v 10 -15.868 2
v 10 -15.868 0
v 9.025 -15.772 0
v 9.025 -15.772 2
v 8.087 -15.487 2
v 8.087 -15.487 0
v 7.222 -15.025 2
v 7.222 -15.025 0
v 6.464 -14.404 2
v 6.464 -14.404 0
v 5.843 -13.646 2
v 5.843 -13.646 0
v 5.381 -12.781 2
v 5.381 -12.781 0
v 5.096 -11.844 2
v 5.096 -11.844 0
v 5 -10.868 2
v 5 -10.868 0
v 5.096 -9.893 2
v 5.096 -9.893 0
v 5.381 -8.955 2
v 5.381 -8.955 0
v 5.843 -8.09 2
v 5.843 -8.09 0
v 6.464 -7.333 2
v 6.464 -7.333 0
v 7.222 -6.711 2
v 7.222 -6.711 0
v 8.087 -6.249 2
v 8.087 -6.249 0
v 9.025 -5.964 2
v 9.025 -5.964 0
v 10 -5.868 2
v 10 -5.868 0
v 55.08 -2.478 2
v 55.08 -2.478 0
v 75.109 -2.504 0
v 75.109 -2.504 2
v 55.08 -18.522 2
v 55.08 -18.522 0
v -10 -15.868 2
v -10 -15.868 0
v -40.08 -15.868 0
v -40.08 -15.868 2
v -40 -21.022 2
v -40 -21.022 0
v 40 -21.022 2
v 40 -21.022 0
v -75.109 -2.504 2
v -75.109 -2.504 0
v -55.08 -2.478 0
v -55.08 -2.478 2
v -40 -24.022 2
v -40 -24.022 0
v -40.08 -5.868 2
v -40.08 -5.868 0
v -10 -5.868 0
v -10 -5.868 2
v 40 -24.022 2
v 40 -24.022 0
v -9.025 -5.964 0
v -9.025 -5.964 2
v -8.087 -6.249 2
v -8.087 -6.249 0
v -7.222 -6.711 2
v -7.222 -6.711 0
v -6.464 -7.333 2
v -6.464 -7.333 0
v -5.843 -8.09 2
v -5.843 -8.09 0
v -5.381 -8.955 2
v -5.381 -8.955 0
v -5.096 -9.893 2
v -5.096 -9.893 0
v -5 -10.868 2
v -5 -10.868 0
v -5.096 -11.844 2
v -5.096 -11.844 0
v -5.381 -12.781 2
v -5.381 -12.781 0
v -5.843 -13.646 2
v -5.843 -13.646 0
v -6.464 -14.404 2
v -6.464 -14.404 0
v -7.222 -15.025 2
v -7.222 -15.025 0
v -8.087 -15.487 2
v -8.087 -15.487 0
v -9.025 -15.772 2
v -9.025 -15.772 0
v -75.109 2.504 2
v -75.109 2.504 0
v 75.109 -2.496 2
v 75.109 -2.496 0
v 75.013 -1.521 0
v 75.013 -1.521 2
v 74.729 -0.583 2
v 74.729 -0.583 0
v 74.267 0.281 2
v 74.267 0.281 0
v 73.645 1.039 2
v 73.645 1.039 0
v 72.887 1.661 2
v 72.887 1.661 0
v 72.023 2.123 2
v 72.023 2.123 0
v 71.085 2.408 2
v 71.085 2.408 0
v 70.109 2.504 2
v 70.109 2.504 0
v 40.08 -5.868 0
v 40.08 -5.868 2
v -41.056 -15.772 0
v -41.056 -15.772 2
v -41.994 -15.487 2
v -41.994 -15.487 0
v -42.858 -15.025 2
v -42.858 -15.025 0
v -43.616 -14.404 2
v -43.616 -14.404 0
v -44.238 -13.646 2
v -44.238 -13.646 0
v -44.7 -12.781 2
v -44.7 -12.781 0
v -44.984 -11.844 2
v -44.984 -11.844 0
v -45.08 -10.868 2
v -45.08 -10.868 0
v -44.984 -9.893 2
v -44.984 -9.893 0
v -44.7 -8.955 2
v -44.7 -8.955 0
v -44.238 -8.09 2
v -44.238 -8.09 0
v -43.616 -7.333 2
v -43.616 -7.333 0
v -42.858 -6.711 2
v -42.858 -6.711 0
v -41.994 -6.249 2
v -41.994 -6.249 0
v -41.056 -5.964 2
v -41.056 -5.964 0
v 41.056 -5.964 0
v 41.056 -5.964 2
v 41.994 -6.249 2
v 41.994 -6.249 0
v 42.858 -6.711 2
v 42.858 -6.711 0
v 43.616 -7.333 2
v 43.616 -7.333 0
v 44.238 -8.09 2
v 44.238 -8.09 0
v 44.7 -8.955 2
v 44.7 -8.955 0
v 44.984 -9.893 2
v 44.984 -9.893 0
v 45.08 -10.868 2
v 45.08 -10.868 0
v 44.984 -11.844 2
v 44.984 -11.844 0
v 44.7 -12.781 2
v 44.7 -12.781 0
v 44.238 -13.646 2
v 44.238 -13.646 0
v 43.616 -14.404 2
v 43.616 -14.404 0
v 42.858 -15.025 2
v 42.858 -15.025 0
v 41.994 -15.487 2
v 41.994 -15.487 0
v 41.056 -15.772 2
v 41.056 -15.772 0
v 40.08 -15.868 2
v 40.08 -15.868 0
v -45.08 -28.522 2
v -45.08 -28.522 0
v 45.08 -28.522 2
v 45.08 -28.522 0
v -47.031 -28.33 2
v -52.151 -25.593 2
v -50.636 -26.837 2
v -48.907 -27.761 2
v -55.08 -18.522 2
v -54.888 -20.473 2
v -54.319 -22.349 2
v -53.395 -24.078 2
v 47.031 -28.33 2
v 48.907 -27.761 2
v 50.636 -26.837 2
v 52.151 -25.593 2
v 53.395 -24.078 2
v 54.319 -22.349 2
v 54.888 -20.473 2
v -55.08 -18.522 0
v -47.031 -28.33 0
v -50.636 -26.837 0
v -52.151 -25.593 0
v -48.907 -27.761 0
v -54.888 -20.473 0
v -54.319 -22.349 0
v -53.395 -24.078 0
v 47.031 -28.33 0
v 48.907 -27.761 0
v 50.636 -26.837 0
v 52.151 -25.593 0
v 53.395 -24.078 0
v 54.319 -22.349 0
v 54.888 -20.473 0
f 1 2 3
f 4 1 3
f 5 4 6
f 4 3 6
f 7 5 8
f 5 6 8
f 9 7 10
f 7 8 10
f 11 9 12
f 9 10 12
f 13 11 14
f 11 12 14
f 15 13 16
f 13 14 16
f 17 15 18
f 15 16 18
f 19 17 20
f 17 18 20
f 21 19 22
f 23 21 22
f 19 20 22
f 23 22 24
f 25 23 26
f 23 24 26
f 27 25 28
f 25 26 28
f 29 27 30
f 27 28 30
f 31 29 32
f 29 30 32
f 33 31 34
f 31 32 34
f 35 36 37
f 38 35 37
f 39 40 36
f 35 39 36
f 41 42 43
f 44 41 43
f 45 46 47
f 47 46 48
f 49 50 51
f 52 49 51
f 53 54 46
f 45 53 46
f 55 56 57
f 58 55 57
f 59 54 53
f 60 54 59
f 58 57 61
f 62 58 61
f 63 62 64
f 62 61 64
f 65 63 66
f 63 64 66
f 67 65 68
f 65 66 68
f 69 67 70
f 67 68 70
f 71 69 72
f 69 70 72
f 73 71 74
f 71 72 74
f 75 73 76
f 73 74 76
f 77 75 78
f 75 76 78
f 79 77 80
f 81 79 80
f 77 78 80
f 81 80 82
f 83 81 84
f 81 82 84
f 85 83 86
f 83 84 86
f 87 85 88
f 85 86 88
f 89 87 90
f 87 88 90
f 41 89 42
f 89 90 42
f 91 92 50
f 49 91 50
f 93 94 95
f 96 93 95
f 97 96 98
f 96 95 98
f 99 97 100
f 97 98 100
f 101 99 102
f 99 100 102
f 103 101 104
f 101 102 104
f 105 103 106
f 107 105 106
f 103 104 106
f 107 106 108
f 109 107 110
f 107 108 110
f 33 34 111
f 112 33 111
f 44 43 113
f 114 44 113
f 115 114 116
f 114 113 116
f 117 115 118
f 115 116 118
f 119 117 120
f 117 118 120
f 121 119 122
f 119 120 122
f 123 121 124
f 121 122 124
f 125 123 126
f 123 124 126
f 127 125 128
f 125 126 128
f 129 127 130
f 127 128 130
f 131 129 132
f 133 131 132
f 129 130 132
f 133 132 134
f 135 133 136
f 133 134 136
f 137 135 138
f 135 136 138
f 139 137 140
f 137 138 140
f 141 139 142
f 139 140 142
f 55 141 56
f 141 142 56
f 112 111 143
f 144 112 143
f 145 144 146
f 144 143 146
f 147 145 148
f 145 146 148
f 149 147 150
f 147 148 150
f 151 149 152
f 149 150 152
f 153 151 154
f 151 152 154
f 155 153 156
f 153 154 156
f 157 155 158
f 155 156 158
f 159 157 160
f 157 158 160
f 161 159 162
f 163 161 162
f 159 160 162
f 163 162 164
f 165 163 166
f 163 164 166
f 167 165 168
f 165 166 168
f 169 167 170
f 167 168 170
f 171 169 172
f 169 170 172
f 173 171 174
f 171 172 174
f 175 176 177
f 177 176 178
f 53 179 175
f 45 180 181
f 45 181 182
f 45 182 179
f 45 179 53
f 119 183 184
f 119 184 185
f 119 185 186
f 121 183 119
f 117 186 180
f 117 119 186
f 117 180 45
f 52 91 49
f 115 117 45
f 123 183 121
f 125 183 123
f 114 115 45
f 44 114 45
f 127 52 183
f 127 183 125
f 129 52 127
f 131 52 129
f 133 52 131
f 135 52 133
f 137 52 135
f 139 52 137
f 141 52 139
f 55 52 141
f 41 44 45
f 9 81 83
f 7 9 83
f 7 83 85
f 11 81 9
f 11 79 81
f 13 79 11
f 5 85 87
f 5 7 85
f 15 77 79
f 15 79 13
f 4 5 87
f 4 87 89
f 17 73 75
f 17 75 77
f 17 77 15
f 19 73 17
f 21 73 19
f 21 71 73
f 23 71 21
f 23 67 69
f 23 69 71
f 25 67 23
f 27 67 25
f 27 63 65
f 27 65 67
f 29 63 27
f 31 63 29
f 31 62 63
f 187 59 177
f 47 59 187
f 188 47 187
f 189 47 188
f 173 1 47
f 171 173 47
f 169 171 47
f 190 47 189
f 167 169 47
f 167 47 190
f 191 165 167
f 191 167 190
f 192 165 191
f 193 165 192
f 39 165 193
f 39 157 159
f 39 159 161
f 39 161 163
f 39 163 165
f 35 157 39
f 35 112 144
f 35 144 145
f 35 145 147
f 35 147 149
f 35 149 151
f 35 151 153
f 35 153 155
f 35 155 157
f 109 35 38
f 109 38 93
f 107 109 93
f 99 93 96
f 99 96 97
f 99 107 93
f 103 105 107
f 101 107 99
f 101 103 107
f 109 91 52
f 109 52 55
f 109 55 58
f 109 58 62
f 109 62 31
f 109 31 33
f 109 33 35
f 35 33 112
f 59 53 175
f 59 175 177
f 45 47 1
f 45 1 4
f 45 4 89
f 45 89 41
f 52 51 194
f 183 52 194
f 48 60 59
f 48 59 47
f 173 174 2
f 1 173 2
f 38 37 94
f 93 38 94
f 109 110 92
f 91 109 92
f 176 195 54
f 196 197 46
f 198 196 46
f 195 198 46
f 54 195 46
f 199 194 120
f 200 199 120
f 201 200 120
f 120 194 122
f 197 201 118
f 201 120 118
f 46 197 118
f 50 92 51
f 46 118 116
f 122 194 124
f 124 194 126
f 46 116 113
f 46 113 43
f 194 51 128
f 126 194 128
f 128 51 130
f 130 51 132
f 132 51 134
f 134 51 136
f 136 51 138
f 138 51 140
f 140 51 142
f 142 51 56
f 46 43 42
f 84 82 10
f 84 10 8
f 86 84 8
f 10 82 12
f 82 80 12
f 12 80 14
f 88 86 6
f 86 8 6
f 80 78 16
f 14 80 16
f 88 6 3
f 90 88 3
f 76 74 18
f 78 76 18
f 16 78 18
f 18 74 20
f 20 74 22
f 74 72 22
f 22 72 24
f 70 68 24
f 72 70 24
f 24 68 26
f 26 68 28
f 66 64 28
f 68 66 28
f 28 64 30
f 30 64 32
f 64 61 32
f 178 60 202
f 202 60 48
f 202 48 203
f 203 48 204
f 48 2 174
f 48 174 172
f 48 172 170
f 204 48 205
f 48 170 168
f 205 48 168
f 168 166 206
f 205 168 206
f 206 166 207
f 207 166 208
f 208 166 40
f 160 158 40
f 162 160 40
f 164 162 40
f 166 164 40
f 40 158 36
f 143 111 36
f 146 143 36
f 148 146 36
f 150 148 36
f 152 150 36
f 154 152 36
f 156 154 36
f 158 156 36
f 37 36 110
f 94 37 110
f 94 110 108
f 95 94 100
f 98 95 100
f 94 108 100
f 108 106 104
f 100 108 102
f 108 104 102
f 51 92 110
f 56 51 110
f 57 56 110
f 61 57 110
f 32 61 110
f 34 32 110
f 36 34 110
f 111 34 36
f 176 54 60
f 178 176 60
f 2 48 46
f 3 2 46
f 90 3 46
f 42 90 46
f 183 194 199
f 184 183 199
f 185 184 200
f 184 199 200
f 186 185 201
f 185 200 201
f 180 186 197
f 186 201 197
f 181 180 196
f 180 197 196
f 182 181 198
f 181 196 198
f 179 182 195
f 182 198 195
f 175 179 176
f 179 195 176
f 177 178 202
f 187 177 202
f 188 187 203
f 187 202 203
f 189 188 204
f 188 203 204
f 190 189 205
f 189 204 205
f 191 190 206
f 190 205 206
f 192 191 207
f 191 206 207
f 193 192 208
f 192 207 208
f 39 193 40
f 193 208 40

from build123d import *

# Parameters (mm, degrees)
SKETCH1_W           = 80
SKETCH1_H           = 3
BOSS_EXTRUDE1_DEPTH = 2


with BuildPart() as part:
    # Sketch1 → Boss-Extrude1 (new body)
    # profile 1 of 2: a face of its own
    with BuildSketch(Plane.XY):
        with BuildLine():
            Line((-75.109333092, -2.496355564), (-75.109333092, -2.503644436))
            Line((-75.109333092, -2.503644436), (-55.0801776, -2.478133382))
            Line((-55.0801776, -2.478133382), (-55.0801776, -18.521866618))
            ThreePointArc((-55.0801776, -18.521866618), (-52.151245412, -25.59293443), (-45.0801776, -28.521866618))
            Line((-45.0801776, -28.521866618), (45.0801776, -28.521866618))
            ThreePointArc((45.0801776, -28.521866618), (52.151245412, -25.59293443), (55.0801776, -18.521866618))
            Line((55.0801776, -18.521866618), (55.0801776, -2.478133382))
            Line((55.0801776, -2.478133382), (75.109333092, -2.503644436))
            Line((75.109333092, -2.503644436), (75.109333092, -2.496355564))
            ThreePointArc((75.109333092, -2.496355564), (73.644866997, 1.039178342), (70.109333092, 2.503644436))
            Line((70.109333092, 2.503644436), (-70.109333092, 2.503644436))
            Line((-70.109333092, 2.503644436), (-75.109333092, 2.503644436))
            Line((-75.109333092, 2.503644436), (-75.109333092, -2.496355564))
        make_face()
        with Locations((0, -22.521866618)):
            Rectangle(SKETCH1_W, SKETCH1_H, mode=Mode.SUBTRACT)
        with BuildLine():
            ThreePointArc((-40.0801776, -15.868057699), (-45.0801776, -10.868057699), (-40.0801776, -5.868057699))
            Line((-40.0801776, -5.868057699), (-10, -5.868057699))
            ThreePointArc((-10, -5.868057699), (-5, -10.868057699), (-10, -15.868057699))
            Line((-10, -15.868057699), (-40.0801776, -15.868057699))
        make_face(mode=Mode.SUBTRACT)
        with BuildLine():
            ThreePointArc((10, -15.868057699), (5, -10.868057699), (10, -5.868057699))
            Line((10, -5.868057699), (40.0801776, -5.868057699))
            ThreePointArc((40.0801776, -5.868057699), (45.0801776, -10.868057699), (40.0801776, -15.868057699))
            Line((40.0801776, -15.868057699), (10, -15.868057699))
        make_face(mode=Mode.SUBTRACT)
    # profile 2 of 2: a face of its own
    with BuildSketch(Plane.XY):
        with BuildLine():
            Line((-75.109333092, -2.496355564), (-75.109333092, -2.503644436))
            Line((-75.109333092, -2.503644436), (-55.0801776, -2.478133382))
            Line((-55.0801776, -2.478133382), (-55.0801776, -18.521866618))
            ThreePointArc((-55.0801776, -18.521866618), (-52.151245412, -25.59293443), (-45.0801776, -28.521866618))
            Line((-45.0801776, -28.521866618), (45.0801776, -28.521866618))
            ThreePointArc((45.0801776, -28.521866618), (52.151245412, -25.59293443), (55.0801776, -18.521866618))
            Line((55.0801776, -18.521866618), (55.0801776, -2.478133382))
            Line((55.0801776, -2.478133382), (75.109333092, -2.503644436))
            Line((75.109333092, -2.503644436), (75.109333092, -2.496355564))
            ThreePointArc((75.109333092, -2.496355564), (73.644866997, 1.039178342), (70.109333092, 2.503644436))
            Line((70.109333092, 2.503644436), (-70.109333092, 2.503644436))
            Line((-70.109333092, 2.503644436), (-75.109333092, 2.503644436))
            Line((-75.109333092, 2.503644436), (-75.109333092, -2.496355564))
        make_face()
        with Locations((0, -22.521866618)):
            Rectangle(SKETCH1_W, SKETCH1_H, mode=Mode.SUBTRACT)
        with BuildLine():
            ThreePointArc((-40.0801776, -15.868057699), (-45.0801776, -10.868057699), (-40.0801776, -5.868057699))
            Line((-40.0801776, -5.868057699), (-10, -5.868057699))
            ThreePointArc((-10, -5.868057699), (-5, -10.868057699), (-10, -15.868057699))
            Line((-10, -15.868057699), (-40.0801776, -15.868057699))
        make_face(mode=Mode.SUBTRACT)
        with BuildLine():
            ThreePointArc((10, -15.868057699), (5, -10.868057699), (10, -5.868057699))
            Line((10, -5.868057699), (40.0801776, -5.868057699))
            ThreePointArc((40.0801776, -5.868057699), (45.0801776, -10.868057699), (40.0801776, -15.868057699))
            Line((40.0801776, -15.868057699), (10, -15.868057699))
        make_face(mode=Mode.SUBTRACT)
    extrude(amount=BOSS_EXTRUDE1_DEPTH)


solid = part.part
